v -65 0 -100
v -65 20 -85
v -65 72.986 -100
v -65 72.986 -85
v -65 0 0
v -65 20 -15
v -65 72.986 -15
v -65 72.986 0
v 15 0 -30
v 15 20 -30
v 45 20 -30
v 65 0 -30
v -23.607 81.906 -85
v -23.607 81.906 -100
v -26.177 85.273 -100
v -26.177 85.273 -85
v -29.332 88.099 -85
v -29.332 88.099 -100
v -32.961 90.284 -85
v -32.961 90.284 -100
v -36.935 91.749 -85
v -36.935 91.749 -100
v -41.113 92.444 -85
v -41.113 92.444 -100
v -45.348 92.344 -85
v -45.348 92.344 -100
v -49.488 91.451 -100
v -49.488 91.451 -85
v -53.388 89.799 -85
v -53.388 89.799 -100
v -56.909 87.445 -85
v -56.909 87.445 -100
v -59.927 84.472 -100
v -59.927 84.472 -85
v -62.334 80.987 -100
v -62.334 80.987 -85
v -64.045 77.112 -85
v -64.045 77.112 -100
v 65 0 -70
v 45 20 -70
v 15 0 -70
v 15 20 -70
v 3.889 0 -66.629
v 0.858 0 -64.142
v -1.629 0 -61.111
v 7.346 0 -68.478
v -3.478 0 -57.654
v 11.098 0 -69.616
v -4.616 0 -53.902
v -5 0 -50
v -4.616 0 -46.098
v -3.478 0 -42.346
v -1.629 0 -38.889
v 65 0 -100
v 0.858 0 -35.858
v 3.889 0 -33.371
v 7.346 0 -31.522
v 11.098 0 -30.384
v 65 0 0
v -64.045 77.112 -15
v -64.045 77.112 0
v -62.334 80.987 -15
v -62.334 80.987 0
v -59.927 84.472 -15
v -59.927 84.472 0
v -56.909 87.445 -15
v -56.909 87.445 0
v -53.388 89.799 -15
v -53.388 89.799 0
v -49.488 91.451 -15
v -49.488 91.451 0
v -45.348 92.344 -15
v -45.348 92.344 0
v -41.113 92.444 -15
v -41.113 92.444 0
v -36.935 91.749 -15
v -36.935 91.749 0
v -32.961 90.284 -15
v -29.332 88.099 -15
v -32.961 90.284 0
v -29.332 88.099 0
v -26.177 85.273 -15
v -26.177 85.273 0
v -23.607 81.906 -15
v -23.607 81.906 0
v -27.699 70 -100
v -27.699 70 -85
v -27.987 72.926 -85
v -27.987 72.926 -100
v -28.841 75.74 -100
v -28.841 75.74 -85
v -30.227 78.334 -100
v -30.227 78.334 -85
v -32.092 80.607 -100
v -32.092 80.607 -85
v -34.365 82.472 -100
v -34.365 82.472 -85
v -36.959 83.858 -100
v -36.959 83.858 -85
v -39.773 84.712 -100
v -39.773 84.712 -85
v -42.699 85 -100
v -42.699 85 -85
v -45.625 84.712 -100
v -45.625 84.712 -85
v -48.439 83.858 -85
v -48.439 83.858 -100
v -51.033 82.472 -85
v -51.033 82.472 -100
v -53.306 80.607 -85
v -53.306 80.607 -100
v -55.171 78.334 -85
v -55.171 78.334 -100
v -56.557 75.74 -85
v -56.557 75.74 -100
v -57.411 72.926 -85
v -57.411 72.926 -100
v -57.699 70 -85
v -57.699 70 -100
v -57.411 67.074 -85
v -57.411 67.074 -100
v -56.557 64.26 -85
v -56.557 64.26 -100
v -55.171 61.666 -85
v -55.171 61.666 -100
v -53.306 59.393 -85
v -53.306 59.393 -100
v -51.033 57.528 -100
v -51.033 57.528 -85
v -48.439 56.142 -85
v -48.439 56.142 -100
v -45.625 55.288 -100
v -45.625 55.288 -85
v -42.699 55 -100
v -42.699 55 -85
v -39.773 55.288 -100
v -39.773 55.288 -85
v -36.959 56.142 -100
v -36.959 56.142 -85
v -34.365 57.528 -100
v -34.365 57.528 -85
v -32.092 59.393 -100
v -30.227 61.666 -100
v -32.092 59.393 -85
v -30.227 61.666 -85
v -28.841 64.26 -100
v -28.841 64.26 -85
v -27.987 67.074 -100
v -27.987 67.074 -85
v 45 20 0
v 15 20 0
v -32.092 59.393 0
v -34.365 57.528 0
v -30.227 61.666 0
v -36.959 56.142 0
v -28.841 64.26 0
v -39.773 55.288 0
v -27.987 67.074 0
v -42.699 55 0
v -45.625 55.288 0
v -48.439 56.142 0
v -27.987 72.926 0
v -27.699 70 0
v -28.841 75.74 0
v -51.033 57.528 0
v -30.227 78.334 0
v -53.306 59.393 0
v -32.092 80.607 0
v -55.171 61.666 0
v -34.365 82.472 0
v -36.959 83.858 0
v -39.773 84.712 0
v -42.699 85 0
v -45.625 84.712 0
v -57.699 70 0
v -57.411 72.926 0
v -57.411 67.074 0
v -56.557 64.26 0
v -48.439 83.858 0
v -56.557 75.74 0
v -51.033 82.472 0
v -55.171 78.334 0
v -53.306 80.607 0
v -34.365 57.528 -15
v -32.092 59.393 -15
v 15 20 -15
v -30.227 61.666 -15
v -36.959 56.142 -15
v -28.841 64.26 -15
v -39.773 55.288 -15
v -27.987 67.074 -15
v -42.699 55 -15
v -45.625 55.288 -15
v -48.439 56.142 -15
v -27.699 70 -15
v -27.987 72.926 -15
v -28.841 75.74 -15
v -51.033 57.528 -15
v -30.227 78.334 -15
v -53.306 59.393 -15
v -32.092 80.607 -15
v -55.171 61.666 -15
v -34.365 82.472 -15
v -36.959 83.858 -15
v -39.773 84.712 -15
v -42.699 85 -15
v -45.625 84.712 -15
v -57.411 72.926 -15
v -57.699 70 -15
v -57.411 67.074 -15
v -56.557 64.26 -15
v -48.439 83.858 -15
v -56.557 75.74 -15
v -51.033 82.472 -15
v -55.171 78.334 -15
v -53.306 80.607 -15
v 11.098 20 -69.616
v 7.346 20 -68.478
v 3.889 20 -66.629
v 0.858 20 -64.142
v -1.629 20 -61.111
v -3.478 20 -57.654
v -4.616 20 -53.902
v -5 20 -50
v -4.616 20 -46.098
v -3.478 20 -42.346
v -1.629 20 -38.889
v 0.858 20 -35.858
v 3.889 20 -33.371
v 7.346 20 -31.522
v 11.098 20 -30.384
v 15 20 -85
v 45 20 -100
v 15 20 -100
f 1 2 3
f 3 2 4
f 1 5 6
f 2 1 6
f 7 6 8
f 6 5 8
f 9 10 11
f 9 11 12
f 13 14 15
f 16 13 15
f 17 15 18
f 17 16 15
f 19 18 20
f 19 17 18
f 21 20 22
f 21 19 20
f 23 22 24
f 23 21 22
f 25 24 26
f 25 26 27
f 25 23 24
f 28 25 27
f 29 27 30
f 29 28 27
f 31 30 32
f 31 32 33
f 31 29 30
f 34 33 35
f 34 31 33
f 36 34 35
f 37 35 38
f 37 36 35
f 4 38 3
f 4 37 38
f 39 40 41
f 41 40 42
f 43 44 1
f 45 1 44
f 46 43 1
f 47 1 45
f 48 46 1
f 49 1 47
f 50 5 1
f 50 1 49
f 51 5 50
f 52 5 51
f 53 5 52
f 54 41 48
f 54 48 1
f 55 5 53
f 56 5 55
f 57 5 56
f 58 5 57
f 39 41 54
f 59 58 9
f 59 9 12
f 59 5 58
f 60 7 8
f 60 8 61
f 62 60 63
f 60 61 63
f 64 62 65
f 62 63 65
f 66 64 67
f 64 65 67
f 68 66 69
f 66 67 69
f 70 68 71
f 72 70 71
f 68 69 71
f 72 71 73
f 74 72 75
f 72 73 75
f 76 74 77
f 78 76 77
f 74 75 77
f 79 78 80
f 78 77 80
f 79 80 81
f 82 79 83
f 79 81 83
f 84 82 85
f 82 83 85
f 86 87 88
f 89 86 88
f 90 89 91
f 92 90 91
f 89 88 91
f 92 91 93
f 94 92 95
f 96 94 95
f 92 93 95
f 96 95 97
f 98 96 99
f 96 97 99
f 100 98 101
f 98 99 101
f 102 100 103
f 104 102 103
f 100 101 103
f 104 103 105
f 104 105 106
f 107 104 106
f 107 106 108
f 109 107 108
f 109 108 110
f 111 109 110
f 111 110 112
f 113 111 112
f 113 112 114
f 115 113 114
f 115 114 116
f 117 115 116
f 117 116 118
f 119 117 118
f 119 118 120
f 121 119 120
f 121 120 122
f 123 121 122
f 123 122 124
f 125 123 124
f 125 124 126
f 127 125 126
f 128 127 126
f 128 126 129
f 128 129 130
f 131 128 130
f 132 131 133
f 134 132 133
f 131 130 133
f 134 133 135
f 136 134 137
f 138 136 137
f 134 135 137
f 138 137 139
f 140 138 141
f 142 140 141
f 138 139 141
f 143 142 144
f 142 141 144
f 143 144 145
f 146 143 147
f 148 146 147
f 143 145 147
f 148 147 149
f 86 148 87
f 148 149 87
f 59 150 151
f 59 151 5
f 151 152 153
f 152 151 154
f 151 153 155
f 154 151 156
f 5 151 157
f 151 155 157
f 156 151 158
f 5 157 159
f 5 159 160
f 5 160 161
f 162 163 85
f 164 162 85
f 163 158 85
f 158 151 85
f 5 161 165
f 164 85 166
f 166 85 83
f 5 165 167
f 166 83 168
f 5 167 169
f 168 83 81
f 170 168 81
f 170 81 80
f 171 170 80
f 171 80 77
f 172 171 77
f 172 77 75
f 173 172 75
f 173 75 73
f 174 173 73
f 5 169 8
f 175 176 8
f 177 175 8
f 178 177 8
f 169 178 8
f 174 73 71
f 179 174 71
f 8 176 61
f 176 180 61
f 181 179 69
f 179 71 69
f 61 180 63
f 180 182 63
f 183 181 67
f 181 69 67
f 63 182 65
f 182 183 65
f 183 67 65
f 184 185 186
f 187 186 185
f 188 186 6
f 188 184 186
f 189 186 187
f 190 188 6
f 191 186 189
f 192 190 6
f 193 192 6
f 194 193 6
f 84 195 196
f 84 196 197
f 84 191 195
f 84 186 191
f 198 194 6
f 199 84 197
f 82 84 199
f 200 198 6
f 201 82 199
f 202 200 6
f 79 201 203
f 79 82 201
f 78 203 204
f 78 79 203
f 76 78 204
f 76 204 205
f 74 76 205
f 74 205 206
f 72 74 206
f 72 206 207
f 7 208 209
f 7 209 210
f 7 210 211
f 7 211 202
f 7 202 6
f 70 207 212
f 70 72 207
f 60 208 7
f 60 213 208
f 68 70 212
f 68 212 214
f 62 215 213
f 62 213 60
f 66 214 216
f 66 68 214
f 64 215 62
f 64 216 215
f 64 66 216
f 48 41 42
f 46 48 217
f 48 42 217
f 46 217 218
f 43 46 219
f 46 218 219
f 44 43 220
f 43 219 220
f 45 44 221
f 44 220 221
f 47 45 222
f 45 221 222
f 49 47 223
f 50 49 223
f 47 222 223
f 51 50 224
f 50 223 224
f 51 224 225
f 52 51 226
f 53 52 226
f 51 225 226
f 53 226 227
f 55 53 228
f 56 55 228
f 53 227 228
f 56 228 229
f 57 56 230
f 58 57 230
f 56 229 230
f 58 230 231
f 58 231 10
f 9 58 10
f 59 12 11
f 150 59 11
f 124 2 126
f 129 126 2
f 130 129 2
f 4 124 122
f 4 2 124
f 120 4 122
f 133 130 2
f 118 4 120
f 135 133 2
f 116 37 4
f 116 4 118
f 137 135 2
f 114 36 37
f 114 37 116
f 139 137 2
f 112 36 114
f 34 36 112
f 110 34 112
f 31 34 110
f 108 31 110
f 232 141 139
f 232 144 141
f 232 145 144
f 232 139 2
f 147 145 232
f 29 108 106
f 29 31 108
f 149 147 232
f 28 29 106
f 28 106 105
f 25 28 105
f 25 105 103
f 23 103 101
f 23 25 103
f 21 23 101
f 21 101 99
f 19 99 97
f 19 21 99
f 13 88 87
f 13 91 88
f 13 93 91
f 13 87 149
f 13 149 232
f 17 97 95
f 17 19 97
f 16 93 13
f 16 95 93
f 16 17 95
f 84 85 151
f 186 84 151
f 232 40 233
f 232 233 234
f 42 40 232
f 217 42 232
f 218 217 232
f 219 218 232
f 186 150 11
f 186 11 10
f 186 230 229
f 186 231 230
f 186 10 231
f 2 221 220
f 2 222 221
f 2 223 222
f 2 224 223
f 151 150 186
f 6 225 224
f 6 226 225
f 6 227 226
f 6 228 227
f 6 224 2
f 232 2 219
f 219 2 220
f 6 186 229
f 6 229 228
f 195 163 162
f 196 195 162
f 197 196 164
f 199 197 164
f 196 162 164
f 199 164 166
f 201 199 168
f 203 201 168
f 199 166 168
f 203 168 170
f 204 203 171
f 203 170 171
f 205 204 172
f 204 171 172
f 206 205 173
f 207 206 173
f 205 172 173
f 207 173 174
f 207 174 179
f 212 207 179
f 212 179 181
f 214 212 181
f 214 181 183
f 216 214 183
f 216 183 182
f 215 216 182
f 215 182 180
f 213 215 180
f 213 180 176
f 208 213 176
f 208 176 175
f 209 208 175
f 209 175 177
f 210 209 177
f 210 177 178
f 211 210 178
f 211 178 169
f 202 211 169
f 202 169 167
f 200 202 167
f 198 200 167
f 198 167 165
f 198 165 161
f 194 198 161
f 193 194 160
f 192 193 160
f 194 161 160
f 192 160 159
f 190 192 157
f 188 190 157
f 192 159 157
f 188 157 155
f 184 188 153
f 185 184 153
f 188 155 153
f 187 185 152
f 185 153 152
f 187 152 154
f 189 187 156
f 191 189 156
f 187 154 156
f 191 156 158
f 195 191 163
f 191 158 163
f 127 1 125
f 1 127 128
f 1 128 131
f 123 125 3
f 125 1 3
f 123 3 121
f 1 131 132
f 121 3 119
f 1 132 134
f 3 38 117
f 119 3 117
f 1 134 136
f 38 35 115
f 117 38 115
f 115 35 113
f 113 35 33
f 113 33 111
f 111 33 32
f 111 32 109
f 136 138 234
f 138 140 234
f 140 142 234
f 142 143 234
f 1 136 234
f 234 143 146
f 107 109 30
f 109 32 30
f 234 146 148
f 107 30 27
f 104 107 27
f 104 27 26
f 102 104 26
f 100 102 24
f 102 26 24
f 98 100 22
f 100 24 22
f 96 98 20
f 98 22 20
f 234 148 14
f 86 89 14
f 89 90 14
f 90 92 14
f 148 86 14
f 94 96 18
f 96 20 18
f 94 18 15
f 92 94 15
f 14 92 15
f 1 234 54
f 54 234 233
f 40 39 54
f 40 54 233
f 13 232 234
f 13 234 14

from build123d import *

# Parameters (mm, degrees)
BOSS_EXTRUDE2_DEPTH = 100
CUT_EXTRUDE1_DEPTH  = 121.933866224
BOSS_EXTRUDE6_DEPTH = 15
BOSS_EXTRUDE8_START = -15
BOSS_EXTRUDE8_DEPTH = 15
SKETCH10_R          = 15
CUT_EXTRUDE2_DEPTH  = 151.934588481


with BuildPart() as part:
    # Sketch2 → Boss-Extrude2 (new body)
    with BuildSketch(Plane.XY):
        Polygon((65, 0), (45, 20), (-65, 20), (-65, 0), align=None)
    extrude(amount=-BOSS_EXTRUDE2_DEPTH)

    # Sketch3 → Cut-Extrude1 (cut, through all)
    with BuildSketch(Plane(origin=(0, 20, 0), x_dir=(1, 0, 0), z_dir=(0, 1, 0))):
        with BuildLine():
            Line((65, 70), (15, 70))
            ThreePointArc((15, 70), (-5, 50), (15, 30))
            Line((15, 30), (65, 30))
            Line((65, 30), (65, 70))
        make_face()
    extrude(amount=-CUT_EXTRUDE1_DEPTH, mode=Mode.SUBTRACT)

    # Sketch4 → Boss-Extrude6 (add)
    with BuildSketch(Plane.XY):
        with BuildLine():
            Line((-65, 20), (-65, 72.98579059))
            ThreePointArc((-65, 72.98579059), (-47.439143931, 91.99502078), (-23.607384696, 81.906326611))
            Line((-23.607384696, 81.906326611), (15, 20))
            Line((15, 20), (-65, 20))
        make_face()
    extrude(amount=-BOSS_EXTRUDE6_DEPTH)

    # Sketch9 → Boss-Extrude8 (add)
    with BuildSketch(Plane(origin=(0, 0, -100), x_dir=(-1, 0, 0), z_dir=(0, 0, -1)).offset(BOSS_EXTRUDE8_START)):
        with BuildLine():
            Line((-15, 20), (23.607384696, 81.906326611))
            ThreePointArc((23.607384696, 81.906326611), (47.439143931, 91.99502078), (65, 72.98579059))
            Line((65, 72.98579059), (65, 20))
            Line((65, 20), (-15, 20))
        make_face()
    extrude(amount=BOSS_EXTRUDE8_DEPTH)

    # Sketch10 → Cut-Extrude2 (cut, through all)
    with BuildSketch(Plane.XY):
        with Locations((-42.698989831, 70)):
            Circle(SKETCH10_R)
    extrude(amount=-CUT_EXTRUDE2_DEPTH, mode=Mode.SUBTRACT)


solid = part.part
